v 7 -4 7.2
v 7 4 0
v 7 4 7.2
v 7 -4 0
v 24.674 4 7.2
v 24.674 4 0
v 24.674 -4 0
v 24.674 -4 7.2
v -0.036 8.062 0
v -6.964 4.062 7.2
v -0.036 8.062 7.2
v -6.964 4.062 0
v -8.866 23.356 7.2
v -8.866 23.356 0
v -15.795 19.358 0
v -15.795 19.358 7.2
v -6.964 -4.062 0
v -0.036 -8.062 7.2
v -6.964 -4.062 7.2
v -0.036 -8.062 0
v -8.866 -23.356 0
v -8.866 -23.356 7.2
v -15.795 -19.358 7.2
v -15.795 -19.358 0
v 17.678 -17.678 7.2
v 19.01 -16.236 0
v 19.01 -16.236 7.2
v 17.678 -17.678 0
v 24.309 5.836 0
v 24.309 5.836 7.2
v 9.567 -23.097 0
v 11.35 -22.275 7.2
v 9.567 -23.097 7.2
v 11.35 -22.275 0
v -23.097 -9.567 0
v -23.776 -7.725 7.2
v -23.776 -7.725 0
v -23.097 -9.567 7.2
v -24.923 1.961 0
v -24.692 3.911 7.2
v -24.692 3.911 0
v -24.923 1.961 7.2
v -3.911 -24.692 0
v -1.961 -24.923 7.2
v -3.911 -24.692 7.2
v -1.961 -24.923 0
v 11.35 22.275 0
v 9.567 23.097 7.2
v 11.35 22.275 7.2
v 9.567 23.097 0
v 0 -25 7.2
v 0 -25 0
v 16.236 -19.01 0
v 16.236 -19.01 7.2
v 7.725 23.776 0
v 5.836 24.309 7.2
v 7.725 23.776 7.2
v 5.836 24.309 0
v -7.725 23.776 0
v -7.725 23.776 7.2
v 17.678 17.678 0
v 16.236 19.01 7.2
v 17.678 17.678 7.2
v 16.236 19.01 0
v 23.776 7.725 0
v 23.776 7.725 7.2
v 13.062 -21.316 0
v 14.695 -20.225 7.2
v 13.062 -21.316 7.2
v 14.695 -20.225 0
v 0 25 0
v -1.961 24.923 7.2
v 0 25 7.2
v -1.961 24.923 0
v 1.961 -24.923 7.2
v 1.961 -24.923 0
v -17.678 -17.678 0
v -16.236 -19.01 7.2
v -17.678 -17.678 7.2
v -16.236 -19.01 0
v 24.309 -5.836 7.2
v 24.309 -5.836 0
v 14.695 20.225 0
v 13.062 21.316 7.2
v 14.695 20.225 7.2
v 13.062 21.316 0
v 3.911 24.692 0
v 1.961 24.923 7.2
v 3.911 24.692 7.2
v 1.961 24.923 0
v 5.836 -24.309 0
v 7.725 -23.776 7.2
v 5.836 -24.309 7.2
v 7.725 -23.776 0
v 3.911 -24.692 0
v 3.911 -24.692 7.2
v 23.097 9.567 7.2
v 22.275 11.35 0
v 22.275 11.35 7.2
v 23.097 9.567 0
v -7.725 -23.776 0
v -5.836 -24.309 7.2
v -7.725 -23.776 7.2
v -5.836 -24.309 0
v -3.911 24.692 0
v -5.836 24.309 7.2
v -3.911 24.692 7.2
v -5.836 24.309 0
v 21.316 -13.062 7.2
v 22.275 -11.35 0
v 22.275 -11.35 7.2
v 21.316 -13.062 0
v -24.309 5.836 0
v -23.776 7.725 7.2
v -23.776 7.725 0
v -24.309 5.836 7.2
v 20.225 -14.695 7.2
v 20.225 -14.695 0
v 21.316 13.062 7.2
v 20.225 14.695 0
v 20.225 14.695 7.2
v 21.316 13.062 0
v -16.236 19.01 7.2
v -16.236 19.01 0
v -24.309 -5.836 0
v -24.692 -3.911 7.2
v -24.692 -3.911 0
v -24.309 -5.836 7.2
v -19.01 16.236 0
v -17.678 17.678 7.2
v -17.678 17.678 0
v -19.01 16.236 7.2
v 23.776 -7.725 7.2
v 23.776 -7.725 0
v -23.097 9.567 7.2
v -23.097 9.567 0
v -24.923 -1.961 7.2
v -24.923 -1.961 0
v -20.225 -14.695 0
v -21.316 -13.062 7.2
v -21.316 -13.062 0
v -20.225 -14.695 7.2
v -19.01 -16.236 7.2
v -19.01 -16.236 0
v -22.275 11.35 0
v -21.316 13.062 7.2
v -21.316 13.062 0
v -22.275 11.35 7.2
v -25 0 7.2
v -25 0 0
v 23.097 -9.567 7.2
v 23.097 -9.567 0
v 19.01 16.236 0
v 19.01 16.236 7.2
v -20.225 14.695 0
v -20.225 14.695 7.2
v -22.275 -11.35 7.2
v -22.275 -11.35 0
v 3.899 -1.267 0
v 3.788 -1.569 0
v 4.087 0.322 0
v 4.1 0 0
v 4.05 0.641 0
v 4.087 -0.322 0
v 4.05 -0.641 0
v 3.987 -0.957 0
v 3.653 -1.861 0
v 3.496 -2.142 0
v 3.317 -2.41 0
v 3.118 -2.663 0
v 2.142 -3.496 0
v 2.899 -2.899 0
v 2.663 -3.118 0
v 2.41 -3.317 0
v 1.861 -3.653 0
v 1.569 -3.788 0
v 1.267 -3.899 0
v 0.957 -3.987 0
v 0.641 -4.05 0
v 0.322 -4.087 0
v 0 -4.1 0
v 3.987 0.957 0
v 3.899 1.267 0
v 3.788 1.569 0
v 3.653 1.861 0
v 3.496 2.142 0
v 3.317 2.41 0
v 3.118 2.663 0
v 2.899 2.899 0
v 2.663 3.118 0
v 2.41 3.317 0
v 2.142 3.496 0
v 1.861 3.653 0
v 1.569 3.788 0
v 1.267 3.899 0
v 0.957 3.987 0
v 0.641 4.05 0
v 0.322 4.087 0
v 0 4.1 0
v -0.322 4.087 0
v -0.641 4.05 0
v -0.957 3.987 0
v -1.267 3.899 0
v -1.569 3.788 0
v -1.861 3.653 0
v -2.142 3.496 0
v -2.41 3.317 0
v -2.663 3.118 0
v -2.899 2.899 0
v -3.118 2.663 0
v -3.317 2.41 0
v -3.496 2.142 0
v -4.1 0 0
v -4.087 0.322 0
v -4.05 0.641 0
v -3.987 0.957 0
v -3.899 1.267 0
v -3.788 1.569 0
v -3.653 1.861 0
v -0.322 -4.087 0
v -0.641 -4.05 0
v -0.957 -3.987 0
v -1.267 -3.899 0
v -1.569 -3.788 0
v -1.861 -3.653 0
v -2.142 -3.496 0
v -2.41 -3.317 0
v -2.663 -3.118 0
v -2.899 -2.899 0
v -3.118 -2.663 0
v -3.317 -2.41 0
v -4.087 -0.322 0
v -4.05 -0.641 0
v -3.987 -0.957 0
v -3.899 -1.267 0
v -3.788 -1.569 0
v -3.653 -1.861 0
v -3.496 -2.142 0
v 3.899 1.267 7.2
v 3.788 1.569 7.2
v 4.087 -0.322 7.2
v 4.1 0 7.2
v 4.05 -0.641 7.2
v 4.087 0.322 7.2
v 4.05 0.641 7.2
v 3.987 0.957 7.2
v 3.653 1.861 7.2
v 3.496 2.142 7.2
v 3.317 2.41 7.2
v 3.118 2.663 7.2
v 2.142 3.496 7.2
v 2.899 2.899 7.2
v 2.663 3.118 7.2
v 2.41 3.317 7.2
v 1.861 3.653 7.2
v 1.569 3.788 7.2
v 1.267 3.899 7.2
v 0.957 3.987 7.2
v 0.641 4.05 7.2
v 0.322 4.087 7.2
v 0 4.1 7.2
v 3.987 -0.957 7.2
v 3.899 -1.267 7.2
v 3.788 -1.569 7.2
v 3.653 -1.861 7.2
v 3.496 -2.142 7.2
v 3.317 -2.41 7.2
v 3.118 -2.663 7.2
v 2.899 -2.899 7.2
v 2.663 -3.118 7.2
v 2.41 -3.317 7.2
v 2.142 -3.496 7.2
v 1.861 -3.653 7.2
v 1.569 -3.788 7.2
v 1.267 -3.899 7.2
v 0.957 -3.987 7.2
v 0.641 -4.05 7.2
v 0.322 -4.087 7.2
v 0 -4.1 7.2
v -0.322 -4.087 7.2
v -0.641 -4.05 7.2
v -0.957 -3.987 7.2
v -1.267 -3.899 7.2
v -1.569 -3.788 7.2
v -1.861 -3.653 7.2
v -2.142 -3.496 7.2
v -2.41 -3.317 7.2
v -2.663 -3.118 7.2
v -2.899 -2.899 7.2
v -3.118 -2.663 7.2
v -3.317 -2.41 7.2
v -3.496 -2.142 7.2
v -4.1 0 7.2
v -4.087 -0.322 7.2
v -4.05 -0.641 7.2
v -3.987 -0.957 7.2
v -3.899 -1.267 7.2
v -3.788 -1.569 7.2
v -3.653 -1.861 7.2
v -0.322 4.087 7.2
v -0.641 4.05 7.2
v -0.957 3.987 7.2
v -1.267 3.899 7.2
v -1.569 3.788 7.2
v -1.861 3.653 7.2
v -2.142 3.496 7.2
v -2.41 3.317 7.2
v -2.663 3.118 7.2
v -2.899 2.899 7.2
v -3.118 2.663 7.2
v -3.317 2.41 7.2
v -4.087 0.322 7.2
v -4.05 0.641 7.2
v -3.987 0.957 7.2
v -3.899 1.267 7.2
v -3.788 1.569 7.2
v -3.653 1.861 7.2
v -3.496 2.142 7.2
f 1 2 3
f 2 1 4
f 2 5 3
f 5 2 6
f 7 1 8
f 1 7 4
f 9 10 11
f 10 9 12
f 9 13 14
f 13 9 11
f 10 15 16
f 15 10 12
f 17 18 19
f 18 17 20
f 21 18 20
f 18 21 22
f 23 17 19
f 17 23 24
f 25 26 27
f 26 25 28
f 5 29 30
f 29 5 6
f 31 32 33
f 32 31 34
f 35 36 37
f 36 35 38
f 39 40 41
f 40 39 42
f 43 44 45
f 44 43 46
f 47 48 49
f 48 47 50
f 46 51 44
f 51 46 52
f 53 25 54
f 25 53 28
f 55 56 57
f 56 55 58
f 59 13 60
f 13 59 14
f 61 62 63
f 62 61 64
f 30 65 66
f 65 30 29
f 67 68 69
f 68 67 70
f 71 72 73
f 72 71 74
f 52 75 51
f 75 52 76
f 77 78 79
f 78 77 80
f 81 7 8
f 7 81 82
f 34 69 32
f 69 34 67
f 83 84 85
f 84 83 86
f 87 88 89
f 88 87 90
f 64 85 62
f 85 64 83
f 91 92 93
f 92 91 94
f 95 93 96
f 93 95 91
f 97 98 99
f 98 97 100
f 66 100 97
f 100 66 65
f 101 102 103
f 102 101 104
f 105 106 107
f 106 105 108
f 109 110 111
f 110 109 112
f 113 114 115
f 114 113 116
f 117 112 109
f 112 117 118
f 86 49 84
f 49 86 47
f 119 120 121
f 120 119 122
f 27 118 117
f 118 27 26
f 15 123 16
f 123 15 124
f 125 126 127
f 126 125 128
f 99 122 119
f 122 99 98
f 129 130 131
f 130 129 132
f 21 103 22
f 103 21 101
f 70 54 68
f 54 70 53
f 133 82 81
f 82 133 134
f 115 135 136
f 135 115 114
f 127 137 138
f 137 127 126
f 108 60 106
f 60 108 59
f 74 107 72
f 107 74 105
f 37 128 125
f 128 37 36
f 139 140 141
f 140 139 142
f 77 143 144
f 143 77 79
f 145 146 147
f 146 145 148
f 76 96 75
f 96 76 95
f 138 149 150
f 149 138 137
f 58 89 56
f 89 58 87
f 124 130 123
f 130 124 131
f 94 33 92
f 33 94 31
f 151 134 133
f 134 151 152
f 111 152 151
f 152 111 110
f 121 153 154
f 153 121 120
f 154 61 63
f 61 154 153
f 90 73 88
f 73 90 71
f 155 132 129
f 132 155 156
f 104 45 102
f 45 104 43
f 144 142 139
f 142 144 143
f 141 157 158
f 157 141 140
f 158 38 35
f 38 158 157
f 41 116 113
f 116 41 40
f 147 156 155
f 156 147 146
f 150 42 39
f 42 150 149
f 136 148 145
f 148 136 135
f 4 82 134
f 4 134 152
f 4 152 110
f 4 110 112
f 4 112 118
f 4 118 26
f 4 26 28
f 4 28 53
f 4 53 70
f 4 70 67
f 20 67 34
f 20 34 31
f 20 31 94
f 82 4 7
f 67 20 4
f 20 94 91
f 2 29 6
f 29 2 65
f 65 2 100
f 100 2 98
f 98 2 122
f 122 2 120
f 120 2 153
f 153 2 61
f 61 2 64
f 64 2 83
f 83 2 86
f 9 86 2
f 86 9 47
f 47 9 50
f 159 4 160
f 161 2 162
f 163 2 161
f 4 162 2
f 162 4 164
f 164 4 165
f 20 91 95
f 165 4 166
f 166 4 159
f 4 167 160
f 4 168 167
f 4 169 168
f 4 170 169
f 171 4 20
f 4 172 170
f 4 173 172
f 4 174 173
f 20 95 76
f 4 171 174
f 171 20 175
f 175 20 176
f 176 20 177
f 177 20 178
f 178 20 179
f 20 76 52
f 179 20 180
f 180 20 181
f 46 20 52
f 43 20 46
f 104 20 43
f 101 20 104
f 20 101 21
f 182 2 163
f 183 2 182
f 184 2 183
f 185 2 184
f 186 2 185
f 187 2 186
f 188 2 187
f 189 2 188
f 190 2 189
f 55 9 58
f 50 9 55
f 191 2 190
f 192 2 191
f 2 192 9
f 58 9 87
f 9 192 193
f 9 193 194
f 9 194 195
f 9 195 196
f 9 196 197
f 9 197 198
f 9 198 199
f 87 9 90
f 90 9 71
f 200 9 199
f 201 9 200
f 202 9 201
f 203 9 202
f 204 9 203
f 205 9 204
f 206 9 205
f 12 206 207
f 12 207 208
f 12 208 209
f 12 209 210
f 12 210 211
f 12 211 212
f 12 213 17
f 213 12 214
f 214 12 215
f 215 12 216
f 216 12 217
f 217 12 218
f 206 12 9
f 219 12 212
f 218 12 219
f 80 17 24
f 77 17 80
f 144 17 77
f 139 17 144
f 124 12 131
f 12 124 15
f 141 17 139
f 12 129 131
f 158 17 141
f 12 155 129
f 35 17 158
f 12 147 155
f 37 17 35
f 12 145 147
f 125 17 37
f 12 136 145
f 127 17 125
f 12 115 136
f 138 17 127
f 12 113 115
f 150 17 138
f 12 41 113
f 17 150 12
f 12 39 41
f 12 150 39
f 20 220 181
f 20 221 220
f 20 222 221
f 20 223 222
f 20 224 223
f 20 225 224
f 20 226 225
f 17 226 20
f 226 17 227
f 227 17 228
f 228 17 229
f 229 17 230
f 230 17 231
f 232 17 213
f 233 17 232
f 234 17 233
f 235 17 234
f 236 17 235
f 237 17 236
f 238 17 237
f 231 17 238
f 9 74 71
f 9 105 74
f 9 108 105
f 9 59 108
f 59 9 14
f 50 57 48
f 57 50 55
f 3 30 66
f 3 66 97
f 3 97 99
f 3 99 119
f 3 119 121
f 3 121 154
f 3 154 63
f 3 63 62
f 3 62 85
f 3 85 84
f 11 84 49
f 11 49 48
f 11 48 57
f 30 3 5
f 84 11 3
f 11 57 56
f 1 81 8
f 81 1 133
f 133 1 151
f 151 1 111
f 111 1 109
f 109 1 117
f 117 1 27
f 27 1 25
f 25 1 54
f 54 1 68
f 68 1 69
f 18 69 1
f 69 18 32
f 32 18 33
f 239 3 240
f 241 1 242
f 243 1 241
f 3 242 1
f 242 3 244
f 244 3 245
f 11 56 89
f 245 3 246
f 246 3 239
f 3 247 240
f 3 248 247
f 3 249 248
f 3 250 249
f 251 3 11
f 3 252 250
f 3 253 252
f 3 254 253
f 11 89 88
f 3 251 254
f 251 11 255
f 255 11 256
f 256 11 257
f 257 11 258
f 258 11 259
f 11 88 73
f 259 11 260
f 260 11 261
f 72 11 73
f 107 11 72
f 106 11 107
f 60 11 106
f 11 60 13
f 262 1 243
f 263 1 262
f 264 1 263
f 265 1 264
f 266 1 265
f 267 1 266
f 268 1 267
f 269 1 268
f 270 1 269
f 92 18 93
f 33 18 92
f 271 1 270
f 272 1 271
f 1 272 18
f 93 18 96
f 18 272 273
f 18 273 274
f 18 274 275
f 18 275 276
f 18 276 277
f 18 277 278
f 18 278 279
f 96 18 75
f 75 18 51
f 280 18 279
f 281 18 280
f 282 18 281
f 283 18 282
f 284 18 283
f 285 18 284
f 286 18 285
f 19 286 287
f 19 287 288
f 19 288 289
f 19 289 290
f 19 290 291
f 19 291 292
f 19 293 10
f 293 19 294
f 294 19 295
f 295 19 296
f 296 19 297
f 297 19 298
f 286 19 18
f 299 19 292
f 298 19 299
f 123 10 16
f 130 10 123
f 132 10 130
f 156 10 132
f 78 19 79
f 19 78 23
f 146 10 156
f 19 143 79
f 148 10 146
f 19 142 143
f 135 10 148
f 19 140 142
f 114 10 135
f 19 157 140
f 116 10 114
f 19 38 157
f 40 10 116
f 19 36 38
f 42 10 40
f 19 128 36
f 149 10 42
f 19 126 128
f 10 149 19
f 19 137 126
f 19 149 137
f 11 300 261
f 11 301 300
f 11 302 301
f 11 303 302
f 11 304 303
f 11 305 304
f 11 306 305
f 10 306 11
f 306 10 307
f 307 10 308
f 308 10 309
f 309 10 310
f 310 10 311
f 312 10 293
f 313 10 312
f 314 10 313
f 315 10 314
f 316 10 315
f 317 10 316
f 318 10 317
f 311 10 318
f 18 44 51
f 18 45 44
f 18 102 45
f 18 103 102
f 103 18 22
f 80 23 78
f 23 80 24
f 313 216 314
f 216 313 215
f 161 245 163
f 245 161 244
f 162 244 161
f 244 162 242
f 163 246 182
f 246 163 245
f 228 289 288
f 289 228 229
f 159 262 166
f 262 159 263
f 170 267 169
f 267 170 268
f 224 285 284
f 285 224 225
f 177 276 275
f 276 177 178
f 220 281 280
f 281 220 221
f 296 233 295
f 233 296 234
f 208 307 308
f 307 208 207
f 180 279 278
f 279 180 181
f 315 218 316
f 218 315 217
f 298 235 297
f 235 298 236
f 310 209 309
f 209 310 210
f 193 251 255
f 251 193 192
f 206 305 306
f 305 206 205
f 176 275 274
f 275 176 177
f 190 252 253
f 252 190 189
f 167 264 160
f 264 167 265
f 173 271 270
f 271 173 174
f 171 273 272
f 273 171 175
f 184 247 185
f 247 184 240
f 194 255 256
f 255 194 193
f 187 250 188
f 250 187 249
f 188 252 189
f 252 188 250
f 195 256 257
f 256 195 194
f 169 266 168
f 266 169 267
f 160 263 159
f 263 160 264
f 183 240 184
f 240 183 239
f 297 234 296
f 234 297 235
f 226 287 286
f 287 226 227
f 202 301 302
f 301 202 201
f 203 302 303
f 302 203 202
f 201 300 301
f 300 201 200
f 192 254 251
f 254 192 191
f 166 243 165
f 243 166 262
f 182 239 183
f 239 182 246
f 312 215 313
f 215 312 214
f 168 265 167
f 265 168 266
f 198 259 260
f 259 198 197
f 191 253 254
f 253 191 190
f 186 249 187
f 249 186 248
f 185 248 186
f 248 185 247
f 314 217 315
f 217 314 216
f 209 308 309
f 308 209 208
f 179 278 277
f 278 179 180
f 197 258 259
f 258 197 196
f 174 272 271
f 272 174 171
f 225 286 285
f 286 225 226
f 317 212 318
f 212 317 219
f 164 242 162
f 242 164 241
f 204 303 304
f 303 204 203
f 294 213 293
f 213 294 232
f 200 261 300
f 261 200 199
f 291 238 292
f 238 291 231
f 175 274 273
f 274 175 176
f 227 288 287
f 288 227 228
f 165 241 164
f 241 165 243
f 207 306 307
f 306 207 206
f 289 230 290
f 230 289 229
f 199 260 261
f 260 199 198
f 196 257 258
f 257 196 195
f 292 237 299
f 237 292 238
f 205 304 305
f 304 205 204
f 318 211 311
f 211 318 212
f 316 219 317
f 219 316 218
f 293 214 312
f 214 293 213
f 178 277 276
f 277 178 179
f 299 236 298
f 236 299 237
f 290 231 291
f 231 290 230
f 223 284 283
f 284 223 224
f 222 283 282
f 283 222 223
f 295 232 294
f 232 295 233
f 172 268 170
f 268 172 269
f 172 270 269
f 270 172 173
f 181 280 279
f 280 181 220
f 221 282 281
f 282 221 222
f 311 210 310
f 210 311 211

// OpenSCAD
// file: tri_params.scad
// ============================================================
// SKUA TRI VARIANT PARAMETERS — study values only, tri_ prefixed so
// nothing shadows design_params.scad (check_params enforces that).
//
// The tri v0.1 keeps the dual's vane, stop ring and rod stock
// verbatim and changes the joints: three arms keyed by the spacer
// disc in tri_hub.scad and clamped between fender washers on the
// die-threaded shaft, and screwed stubs at the tips. The later
// ladder steps from scripts/tri_study.py (PTFE washers, film
// vanes, the reach-for-arm trade) keep their values below.
// ============================================================

tri_arms       = 3;    // the consistency fix: no dead parking angle

// --- Washer-jaw hub (tri_hub.scad): one printed spacer disc keys
//     three arms in full-height slots; two large fender washers
//     press onto the proud rods from either side, clamped by M8
//     nylocs on the shaft's die-threaded top end. Steel jaws, no
//     plastic in compression, no seasonal re-torque ---
tri_hub_d        = 50;   // slot flanks run boss to rim: 18 mm of
                         // bearing per arm for horizontal bending
tri_hub_disc_h   = 7.2;  // rod_d minus the clamshell gap: the arms
                         // stand proud of both faces by 0.4, so the
                         // washer preload lands on the rods, never
                         // on face-to-face plastic
tri_hub_boss_d   = 14;   // arm butt circle around the bore
tri_shaft_thread = 40;   // M8x1.25 die length on the shaft's top end
                         // (rod prep: a hand die, no drilling at all)
tri_nut_af       = 13.4; // M8 nyloc across flats, drawn in the scene
tri_nut_t        = 8;
tri_m8_washer_od = 30;   // fender washer: the clamp jaw, gripping
                         // each rod from the boss edge outward
tri_m8_washer_t  = 1.5;
tri_rod_thread   = 10;   // M5x0.8 tap depth (rod prep): both ends of
                         // each stub; the shaft is die-threaded,
                         // never tapped or drilled

// --- Prepared stub tip (tri_tip_bracket.scad, tri_end_cap.scad):
//     the stub is tapped both ends and SCREWED, never clamped.
//     The stop is the ring fin ALONE (field finding from the dual:
//     two stops never land exactly together, one face takes every
//     hit anyway, and the stop-face gate already sizes one face
//     for the full impact), so the cap is a smooth keyless
//     retainer, stub rotation is irrelevant, and the rod prep is
//     two taps, nothing more ---
tri_step_t      = 3;    // printed step under the stub in the bracket
tri_stub_length = 103;  // step to cap bore ceiling: bracket above the
                        // step (21) + boss (2) + washer (1) + sleeve
                        // (70) + running play (1) + cap bore (8)
tri_cap_t       = 14;
tri_cap_bore_h  = 8;    // free locating bore over the stub's top
tri_cap_cbore_d = 13;   // washer + head counterbore, closed face
tri_cap_cbore_h = 3;

// --- Later ladder steps (tri_study.py's numbers; NOT in the v0.1
//     scene, which uses the dual's rod_d / arm_length / vane) ---
tri_arm_rod_d  = 10;   // reach-for-arm trade only; arm rod, never stubs
tri_arm_length = 500;  // span held: shorter arms buy the longer reach
tri_vane_reach = 250;  // film vane reach (dual: 150)
tri_frame_w    = 8;    // printed perimeter frame member width
tri_frame_t    = 4;    // ... and thickness
tri_skin_t     = 0.4;  // membrane, drawn translucent
tri_washer_t   = 1;    // PTFE washer on the stop ring boss
tri_washer_od  = 14;
tri_mast_h     = 300;  // drawn stub of the taller mounting (the study
                      // credits ~10 percent wind for +1 m)
// main file
// ============================================================
// TRI WASHER-JAW HUB — concept CAD, reviewable in tri_assembly.scad.
//
// As small as the job allows: ONE printed spacer disc, just high
// enough to key the rods. Three full-height radial slots hold the
// arms at 120; the disc is thinner than the rod, so the arms stand
// proud of both faces, and two large M8 fender washers press onto
// the rods from either side, clamped by M8 nylocs on the shaft's
// die-threaded top end. The washers are the clamp jaws: the load
// path is steel washer, aluminum rod, steel washer, steel nut,
// with NO plastic in compression anywhere, so unlike every clamp
// on the dual this joint never needs a seasonal re-torque. The
// disc only keys: slot flanks carry the arms' horizontal storm
// bending as bearing, the arms butt the boss circle, and the
// washer faces square the hub on the shaft.
//
// The shaft prep is a hand die, not a tap: 8 mm rod is an M8
// thread blank, so the die self-aligns and this rod is never
// drilled at all. The disc bore rides the thread crests at the
// free fit. The shaft's storm bending at the hub is small (the
// lever down to the top bearing is short), so the threaded
// section carries the storm with a factor near four
// (docs/tri_concept.md records the numbers).
//
// Prints flat on its face in minutes: bore and slots are vertical
// walls, no bridges, no supports.
// ============================================================

include <../design_params.scad>
include <tri_params.scad>

$fn = 80;

// the one printed part of the hub
module tri_hub_disc() {
    difference() {
        cylinder(h = tri_hub_disc_h, d = tri_hub_d);
        // free over the thread crests; the washers do the locating
        translate([0, 0, -0.1])
            cylinder(h = tri_hub_disc_h + 0.2, d = rod_free_d);
        // three full-height slots, snug on the rod flanks, boss
        // circle to rim; the arms butt the boss and stand proud of
        // both faces by half the gap
        for (k = [0 : tri_arms - 1]) rotate([0, 0, k * 360 / tri_arms])
            translate([tri_hub_boss_d / 2, -rod_snug_d / 2, -0.1])
                cube([tri_hub_d / 2 - tri_hub_boss_d / 2 + 1,
                      rod_snug_d, tri_hub_disc_h + 0.2]);
    }
}

// an M8 fender washer and nyloc for the scene, washer at z = 0
module tri_m8_stack() {
    cylinder(h = tri_m8_washer_t, d = tri_m8_washer_od);
    translate([0, 0, tri_m8_washer_t])
        cylinder(h = tri_nut_t, d = tri_nut_af / cos(30), $fn = 6);
}

tri_hub_disc();
